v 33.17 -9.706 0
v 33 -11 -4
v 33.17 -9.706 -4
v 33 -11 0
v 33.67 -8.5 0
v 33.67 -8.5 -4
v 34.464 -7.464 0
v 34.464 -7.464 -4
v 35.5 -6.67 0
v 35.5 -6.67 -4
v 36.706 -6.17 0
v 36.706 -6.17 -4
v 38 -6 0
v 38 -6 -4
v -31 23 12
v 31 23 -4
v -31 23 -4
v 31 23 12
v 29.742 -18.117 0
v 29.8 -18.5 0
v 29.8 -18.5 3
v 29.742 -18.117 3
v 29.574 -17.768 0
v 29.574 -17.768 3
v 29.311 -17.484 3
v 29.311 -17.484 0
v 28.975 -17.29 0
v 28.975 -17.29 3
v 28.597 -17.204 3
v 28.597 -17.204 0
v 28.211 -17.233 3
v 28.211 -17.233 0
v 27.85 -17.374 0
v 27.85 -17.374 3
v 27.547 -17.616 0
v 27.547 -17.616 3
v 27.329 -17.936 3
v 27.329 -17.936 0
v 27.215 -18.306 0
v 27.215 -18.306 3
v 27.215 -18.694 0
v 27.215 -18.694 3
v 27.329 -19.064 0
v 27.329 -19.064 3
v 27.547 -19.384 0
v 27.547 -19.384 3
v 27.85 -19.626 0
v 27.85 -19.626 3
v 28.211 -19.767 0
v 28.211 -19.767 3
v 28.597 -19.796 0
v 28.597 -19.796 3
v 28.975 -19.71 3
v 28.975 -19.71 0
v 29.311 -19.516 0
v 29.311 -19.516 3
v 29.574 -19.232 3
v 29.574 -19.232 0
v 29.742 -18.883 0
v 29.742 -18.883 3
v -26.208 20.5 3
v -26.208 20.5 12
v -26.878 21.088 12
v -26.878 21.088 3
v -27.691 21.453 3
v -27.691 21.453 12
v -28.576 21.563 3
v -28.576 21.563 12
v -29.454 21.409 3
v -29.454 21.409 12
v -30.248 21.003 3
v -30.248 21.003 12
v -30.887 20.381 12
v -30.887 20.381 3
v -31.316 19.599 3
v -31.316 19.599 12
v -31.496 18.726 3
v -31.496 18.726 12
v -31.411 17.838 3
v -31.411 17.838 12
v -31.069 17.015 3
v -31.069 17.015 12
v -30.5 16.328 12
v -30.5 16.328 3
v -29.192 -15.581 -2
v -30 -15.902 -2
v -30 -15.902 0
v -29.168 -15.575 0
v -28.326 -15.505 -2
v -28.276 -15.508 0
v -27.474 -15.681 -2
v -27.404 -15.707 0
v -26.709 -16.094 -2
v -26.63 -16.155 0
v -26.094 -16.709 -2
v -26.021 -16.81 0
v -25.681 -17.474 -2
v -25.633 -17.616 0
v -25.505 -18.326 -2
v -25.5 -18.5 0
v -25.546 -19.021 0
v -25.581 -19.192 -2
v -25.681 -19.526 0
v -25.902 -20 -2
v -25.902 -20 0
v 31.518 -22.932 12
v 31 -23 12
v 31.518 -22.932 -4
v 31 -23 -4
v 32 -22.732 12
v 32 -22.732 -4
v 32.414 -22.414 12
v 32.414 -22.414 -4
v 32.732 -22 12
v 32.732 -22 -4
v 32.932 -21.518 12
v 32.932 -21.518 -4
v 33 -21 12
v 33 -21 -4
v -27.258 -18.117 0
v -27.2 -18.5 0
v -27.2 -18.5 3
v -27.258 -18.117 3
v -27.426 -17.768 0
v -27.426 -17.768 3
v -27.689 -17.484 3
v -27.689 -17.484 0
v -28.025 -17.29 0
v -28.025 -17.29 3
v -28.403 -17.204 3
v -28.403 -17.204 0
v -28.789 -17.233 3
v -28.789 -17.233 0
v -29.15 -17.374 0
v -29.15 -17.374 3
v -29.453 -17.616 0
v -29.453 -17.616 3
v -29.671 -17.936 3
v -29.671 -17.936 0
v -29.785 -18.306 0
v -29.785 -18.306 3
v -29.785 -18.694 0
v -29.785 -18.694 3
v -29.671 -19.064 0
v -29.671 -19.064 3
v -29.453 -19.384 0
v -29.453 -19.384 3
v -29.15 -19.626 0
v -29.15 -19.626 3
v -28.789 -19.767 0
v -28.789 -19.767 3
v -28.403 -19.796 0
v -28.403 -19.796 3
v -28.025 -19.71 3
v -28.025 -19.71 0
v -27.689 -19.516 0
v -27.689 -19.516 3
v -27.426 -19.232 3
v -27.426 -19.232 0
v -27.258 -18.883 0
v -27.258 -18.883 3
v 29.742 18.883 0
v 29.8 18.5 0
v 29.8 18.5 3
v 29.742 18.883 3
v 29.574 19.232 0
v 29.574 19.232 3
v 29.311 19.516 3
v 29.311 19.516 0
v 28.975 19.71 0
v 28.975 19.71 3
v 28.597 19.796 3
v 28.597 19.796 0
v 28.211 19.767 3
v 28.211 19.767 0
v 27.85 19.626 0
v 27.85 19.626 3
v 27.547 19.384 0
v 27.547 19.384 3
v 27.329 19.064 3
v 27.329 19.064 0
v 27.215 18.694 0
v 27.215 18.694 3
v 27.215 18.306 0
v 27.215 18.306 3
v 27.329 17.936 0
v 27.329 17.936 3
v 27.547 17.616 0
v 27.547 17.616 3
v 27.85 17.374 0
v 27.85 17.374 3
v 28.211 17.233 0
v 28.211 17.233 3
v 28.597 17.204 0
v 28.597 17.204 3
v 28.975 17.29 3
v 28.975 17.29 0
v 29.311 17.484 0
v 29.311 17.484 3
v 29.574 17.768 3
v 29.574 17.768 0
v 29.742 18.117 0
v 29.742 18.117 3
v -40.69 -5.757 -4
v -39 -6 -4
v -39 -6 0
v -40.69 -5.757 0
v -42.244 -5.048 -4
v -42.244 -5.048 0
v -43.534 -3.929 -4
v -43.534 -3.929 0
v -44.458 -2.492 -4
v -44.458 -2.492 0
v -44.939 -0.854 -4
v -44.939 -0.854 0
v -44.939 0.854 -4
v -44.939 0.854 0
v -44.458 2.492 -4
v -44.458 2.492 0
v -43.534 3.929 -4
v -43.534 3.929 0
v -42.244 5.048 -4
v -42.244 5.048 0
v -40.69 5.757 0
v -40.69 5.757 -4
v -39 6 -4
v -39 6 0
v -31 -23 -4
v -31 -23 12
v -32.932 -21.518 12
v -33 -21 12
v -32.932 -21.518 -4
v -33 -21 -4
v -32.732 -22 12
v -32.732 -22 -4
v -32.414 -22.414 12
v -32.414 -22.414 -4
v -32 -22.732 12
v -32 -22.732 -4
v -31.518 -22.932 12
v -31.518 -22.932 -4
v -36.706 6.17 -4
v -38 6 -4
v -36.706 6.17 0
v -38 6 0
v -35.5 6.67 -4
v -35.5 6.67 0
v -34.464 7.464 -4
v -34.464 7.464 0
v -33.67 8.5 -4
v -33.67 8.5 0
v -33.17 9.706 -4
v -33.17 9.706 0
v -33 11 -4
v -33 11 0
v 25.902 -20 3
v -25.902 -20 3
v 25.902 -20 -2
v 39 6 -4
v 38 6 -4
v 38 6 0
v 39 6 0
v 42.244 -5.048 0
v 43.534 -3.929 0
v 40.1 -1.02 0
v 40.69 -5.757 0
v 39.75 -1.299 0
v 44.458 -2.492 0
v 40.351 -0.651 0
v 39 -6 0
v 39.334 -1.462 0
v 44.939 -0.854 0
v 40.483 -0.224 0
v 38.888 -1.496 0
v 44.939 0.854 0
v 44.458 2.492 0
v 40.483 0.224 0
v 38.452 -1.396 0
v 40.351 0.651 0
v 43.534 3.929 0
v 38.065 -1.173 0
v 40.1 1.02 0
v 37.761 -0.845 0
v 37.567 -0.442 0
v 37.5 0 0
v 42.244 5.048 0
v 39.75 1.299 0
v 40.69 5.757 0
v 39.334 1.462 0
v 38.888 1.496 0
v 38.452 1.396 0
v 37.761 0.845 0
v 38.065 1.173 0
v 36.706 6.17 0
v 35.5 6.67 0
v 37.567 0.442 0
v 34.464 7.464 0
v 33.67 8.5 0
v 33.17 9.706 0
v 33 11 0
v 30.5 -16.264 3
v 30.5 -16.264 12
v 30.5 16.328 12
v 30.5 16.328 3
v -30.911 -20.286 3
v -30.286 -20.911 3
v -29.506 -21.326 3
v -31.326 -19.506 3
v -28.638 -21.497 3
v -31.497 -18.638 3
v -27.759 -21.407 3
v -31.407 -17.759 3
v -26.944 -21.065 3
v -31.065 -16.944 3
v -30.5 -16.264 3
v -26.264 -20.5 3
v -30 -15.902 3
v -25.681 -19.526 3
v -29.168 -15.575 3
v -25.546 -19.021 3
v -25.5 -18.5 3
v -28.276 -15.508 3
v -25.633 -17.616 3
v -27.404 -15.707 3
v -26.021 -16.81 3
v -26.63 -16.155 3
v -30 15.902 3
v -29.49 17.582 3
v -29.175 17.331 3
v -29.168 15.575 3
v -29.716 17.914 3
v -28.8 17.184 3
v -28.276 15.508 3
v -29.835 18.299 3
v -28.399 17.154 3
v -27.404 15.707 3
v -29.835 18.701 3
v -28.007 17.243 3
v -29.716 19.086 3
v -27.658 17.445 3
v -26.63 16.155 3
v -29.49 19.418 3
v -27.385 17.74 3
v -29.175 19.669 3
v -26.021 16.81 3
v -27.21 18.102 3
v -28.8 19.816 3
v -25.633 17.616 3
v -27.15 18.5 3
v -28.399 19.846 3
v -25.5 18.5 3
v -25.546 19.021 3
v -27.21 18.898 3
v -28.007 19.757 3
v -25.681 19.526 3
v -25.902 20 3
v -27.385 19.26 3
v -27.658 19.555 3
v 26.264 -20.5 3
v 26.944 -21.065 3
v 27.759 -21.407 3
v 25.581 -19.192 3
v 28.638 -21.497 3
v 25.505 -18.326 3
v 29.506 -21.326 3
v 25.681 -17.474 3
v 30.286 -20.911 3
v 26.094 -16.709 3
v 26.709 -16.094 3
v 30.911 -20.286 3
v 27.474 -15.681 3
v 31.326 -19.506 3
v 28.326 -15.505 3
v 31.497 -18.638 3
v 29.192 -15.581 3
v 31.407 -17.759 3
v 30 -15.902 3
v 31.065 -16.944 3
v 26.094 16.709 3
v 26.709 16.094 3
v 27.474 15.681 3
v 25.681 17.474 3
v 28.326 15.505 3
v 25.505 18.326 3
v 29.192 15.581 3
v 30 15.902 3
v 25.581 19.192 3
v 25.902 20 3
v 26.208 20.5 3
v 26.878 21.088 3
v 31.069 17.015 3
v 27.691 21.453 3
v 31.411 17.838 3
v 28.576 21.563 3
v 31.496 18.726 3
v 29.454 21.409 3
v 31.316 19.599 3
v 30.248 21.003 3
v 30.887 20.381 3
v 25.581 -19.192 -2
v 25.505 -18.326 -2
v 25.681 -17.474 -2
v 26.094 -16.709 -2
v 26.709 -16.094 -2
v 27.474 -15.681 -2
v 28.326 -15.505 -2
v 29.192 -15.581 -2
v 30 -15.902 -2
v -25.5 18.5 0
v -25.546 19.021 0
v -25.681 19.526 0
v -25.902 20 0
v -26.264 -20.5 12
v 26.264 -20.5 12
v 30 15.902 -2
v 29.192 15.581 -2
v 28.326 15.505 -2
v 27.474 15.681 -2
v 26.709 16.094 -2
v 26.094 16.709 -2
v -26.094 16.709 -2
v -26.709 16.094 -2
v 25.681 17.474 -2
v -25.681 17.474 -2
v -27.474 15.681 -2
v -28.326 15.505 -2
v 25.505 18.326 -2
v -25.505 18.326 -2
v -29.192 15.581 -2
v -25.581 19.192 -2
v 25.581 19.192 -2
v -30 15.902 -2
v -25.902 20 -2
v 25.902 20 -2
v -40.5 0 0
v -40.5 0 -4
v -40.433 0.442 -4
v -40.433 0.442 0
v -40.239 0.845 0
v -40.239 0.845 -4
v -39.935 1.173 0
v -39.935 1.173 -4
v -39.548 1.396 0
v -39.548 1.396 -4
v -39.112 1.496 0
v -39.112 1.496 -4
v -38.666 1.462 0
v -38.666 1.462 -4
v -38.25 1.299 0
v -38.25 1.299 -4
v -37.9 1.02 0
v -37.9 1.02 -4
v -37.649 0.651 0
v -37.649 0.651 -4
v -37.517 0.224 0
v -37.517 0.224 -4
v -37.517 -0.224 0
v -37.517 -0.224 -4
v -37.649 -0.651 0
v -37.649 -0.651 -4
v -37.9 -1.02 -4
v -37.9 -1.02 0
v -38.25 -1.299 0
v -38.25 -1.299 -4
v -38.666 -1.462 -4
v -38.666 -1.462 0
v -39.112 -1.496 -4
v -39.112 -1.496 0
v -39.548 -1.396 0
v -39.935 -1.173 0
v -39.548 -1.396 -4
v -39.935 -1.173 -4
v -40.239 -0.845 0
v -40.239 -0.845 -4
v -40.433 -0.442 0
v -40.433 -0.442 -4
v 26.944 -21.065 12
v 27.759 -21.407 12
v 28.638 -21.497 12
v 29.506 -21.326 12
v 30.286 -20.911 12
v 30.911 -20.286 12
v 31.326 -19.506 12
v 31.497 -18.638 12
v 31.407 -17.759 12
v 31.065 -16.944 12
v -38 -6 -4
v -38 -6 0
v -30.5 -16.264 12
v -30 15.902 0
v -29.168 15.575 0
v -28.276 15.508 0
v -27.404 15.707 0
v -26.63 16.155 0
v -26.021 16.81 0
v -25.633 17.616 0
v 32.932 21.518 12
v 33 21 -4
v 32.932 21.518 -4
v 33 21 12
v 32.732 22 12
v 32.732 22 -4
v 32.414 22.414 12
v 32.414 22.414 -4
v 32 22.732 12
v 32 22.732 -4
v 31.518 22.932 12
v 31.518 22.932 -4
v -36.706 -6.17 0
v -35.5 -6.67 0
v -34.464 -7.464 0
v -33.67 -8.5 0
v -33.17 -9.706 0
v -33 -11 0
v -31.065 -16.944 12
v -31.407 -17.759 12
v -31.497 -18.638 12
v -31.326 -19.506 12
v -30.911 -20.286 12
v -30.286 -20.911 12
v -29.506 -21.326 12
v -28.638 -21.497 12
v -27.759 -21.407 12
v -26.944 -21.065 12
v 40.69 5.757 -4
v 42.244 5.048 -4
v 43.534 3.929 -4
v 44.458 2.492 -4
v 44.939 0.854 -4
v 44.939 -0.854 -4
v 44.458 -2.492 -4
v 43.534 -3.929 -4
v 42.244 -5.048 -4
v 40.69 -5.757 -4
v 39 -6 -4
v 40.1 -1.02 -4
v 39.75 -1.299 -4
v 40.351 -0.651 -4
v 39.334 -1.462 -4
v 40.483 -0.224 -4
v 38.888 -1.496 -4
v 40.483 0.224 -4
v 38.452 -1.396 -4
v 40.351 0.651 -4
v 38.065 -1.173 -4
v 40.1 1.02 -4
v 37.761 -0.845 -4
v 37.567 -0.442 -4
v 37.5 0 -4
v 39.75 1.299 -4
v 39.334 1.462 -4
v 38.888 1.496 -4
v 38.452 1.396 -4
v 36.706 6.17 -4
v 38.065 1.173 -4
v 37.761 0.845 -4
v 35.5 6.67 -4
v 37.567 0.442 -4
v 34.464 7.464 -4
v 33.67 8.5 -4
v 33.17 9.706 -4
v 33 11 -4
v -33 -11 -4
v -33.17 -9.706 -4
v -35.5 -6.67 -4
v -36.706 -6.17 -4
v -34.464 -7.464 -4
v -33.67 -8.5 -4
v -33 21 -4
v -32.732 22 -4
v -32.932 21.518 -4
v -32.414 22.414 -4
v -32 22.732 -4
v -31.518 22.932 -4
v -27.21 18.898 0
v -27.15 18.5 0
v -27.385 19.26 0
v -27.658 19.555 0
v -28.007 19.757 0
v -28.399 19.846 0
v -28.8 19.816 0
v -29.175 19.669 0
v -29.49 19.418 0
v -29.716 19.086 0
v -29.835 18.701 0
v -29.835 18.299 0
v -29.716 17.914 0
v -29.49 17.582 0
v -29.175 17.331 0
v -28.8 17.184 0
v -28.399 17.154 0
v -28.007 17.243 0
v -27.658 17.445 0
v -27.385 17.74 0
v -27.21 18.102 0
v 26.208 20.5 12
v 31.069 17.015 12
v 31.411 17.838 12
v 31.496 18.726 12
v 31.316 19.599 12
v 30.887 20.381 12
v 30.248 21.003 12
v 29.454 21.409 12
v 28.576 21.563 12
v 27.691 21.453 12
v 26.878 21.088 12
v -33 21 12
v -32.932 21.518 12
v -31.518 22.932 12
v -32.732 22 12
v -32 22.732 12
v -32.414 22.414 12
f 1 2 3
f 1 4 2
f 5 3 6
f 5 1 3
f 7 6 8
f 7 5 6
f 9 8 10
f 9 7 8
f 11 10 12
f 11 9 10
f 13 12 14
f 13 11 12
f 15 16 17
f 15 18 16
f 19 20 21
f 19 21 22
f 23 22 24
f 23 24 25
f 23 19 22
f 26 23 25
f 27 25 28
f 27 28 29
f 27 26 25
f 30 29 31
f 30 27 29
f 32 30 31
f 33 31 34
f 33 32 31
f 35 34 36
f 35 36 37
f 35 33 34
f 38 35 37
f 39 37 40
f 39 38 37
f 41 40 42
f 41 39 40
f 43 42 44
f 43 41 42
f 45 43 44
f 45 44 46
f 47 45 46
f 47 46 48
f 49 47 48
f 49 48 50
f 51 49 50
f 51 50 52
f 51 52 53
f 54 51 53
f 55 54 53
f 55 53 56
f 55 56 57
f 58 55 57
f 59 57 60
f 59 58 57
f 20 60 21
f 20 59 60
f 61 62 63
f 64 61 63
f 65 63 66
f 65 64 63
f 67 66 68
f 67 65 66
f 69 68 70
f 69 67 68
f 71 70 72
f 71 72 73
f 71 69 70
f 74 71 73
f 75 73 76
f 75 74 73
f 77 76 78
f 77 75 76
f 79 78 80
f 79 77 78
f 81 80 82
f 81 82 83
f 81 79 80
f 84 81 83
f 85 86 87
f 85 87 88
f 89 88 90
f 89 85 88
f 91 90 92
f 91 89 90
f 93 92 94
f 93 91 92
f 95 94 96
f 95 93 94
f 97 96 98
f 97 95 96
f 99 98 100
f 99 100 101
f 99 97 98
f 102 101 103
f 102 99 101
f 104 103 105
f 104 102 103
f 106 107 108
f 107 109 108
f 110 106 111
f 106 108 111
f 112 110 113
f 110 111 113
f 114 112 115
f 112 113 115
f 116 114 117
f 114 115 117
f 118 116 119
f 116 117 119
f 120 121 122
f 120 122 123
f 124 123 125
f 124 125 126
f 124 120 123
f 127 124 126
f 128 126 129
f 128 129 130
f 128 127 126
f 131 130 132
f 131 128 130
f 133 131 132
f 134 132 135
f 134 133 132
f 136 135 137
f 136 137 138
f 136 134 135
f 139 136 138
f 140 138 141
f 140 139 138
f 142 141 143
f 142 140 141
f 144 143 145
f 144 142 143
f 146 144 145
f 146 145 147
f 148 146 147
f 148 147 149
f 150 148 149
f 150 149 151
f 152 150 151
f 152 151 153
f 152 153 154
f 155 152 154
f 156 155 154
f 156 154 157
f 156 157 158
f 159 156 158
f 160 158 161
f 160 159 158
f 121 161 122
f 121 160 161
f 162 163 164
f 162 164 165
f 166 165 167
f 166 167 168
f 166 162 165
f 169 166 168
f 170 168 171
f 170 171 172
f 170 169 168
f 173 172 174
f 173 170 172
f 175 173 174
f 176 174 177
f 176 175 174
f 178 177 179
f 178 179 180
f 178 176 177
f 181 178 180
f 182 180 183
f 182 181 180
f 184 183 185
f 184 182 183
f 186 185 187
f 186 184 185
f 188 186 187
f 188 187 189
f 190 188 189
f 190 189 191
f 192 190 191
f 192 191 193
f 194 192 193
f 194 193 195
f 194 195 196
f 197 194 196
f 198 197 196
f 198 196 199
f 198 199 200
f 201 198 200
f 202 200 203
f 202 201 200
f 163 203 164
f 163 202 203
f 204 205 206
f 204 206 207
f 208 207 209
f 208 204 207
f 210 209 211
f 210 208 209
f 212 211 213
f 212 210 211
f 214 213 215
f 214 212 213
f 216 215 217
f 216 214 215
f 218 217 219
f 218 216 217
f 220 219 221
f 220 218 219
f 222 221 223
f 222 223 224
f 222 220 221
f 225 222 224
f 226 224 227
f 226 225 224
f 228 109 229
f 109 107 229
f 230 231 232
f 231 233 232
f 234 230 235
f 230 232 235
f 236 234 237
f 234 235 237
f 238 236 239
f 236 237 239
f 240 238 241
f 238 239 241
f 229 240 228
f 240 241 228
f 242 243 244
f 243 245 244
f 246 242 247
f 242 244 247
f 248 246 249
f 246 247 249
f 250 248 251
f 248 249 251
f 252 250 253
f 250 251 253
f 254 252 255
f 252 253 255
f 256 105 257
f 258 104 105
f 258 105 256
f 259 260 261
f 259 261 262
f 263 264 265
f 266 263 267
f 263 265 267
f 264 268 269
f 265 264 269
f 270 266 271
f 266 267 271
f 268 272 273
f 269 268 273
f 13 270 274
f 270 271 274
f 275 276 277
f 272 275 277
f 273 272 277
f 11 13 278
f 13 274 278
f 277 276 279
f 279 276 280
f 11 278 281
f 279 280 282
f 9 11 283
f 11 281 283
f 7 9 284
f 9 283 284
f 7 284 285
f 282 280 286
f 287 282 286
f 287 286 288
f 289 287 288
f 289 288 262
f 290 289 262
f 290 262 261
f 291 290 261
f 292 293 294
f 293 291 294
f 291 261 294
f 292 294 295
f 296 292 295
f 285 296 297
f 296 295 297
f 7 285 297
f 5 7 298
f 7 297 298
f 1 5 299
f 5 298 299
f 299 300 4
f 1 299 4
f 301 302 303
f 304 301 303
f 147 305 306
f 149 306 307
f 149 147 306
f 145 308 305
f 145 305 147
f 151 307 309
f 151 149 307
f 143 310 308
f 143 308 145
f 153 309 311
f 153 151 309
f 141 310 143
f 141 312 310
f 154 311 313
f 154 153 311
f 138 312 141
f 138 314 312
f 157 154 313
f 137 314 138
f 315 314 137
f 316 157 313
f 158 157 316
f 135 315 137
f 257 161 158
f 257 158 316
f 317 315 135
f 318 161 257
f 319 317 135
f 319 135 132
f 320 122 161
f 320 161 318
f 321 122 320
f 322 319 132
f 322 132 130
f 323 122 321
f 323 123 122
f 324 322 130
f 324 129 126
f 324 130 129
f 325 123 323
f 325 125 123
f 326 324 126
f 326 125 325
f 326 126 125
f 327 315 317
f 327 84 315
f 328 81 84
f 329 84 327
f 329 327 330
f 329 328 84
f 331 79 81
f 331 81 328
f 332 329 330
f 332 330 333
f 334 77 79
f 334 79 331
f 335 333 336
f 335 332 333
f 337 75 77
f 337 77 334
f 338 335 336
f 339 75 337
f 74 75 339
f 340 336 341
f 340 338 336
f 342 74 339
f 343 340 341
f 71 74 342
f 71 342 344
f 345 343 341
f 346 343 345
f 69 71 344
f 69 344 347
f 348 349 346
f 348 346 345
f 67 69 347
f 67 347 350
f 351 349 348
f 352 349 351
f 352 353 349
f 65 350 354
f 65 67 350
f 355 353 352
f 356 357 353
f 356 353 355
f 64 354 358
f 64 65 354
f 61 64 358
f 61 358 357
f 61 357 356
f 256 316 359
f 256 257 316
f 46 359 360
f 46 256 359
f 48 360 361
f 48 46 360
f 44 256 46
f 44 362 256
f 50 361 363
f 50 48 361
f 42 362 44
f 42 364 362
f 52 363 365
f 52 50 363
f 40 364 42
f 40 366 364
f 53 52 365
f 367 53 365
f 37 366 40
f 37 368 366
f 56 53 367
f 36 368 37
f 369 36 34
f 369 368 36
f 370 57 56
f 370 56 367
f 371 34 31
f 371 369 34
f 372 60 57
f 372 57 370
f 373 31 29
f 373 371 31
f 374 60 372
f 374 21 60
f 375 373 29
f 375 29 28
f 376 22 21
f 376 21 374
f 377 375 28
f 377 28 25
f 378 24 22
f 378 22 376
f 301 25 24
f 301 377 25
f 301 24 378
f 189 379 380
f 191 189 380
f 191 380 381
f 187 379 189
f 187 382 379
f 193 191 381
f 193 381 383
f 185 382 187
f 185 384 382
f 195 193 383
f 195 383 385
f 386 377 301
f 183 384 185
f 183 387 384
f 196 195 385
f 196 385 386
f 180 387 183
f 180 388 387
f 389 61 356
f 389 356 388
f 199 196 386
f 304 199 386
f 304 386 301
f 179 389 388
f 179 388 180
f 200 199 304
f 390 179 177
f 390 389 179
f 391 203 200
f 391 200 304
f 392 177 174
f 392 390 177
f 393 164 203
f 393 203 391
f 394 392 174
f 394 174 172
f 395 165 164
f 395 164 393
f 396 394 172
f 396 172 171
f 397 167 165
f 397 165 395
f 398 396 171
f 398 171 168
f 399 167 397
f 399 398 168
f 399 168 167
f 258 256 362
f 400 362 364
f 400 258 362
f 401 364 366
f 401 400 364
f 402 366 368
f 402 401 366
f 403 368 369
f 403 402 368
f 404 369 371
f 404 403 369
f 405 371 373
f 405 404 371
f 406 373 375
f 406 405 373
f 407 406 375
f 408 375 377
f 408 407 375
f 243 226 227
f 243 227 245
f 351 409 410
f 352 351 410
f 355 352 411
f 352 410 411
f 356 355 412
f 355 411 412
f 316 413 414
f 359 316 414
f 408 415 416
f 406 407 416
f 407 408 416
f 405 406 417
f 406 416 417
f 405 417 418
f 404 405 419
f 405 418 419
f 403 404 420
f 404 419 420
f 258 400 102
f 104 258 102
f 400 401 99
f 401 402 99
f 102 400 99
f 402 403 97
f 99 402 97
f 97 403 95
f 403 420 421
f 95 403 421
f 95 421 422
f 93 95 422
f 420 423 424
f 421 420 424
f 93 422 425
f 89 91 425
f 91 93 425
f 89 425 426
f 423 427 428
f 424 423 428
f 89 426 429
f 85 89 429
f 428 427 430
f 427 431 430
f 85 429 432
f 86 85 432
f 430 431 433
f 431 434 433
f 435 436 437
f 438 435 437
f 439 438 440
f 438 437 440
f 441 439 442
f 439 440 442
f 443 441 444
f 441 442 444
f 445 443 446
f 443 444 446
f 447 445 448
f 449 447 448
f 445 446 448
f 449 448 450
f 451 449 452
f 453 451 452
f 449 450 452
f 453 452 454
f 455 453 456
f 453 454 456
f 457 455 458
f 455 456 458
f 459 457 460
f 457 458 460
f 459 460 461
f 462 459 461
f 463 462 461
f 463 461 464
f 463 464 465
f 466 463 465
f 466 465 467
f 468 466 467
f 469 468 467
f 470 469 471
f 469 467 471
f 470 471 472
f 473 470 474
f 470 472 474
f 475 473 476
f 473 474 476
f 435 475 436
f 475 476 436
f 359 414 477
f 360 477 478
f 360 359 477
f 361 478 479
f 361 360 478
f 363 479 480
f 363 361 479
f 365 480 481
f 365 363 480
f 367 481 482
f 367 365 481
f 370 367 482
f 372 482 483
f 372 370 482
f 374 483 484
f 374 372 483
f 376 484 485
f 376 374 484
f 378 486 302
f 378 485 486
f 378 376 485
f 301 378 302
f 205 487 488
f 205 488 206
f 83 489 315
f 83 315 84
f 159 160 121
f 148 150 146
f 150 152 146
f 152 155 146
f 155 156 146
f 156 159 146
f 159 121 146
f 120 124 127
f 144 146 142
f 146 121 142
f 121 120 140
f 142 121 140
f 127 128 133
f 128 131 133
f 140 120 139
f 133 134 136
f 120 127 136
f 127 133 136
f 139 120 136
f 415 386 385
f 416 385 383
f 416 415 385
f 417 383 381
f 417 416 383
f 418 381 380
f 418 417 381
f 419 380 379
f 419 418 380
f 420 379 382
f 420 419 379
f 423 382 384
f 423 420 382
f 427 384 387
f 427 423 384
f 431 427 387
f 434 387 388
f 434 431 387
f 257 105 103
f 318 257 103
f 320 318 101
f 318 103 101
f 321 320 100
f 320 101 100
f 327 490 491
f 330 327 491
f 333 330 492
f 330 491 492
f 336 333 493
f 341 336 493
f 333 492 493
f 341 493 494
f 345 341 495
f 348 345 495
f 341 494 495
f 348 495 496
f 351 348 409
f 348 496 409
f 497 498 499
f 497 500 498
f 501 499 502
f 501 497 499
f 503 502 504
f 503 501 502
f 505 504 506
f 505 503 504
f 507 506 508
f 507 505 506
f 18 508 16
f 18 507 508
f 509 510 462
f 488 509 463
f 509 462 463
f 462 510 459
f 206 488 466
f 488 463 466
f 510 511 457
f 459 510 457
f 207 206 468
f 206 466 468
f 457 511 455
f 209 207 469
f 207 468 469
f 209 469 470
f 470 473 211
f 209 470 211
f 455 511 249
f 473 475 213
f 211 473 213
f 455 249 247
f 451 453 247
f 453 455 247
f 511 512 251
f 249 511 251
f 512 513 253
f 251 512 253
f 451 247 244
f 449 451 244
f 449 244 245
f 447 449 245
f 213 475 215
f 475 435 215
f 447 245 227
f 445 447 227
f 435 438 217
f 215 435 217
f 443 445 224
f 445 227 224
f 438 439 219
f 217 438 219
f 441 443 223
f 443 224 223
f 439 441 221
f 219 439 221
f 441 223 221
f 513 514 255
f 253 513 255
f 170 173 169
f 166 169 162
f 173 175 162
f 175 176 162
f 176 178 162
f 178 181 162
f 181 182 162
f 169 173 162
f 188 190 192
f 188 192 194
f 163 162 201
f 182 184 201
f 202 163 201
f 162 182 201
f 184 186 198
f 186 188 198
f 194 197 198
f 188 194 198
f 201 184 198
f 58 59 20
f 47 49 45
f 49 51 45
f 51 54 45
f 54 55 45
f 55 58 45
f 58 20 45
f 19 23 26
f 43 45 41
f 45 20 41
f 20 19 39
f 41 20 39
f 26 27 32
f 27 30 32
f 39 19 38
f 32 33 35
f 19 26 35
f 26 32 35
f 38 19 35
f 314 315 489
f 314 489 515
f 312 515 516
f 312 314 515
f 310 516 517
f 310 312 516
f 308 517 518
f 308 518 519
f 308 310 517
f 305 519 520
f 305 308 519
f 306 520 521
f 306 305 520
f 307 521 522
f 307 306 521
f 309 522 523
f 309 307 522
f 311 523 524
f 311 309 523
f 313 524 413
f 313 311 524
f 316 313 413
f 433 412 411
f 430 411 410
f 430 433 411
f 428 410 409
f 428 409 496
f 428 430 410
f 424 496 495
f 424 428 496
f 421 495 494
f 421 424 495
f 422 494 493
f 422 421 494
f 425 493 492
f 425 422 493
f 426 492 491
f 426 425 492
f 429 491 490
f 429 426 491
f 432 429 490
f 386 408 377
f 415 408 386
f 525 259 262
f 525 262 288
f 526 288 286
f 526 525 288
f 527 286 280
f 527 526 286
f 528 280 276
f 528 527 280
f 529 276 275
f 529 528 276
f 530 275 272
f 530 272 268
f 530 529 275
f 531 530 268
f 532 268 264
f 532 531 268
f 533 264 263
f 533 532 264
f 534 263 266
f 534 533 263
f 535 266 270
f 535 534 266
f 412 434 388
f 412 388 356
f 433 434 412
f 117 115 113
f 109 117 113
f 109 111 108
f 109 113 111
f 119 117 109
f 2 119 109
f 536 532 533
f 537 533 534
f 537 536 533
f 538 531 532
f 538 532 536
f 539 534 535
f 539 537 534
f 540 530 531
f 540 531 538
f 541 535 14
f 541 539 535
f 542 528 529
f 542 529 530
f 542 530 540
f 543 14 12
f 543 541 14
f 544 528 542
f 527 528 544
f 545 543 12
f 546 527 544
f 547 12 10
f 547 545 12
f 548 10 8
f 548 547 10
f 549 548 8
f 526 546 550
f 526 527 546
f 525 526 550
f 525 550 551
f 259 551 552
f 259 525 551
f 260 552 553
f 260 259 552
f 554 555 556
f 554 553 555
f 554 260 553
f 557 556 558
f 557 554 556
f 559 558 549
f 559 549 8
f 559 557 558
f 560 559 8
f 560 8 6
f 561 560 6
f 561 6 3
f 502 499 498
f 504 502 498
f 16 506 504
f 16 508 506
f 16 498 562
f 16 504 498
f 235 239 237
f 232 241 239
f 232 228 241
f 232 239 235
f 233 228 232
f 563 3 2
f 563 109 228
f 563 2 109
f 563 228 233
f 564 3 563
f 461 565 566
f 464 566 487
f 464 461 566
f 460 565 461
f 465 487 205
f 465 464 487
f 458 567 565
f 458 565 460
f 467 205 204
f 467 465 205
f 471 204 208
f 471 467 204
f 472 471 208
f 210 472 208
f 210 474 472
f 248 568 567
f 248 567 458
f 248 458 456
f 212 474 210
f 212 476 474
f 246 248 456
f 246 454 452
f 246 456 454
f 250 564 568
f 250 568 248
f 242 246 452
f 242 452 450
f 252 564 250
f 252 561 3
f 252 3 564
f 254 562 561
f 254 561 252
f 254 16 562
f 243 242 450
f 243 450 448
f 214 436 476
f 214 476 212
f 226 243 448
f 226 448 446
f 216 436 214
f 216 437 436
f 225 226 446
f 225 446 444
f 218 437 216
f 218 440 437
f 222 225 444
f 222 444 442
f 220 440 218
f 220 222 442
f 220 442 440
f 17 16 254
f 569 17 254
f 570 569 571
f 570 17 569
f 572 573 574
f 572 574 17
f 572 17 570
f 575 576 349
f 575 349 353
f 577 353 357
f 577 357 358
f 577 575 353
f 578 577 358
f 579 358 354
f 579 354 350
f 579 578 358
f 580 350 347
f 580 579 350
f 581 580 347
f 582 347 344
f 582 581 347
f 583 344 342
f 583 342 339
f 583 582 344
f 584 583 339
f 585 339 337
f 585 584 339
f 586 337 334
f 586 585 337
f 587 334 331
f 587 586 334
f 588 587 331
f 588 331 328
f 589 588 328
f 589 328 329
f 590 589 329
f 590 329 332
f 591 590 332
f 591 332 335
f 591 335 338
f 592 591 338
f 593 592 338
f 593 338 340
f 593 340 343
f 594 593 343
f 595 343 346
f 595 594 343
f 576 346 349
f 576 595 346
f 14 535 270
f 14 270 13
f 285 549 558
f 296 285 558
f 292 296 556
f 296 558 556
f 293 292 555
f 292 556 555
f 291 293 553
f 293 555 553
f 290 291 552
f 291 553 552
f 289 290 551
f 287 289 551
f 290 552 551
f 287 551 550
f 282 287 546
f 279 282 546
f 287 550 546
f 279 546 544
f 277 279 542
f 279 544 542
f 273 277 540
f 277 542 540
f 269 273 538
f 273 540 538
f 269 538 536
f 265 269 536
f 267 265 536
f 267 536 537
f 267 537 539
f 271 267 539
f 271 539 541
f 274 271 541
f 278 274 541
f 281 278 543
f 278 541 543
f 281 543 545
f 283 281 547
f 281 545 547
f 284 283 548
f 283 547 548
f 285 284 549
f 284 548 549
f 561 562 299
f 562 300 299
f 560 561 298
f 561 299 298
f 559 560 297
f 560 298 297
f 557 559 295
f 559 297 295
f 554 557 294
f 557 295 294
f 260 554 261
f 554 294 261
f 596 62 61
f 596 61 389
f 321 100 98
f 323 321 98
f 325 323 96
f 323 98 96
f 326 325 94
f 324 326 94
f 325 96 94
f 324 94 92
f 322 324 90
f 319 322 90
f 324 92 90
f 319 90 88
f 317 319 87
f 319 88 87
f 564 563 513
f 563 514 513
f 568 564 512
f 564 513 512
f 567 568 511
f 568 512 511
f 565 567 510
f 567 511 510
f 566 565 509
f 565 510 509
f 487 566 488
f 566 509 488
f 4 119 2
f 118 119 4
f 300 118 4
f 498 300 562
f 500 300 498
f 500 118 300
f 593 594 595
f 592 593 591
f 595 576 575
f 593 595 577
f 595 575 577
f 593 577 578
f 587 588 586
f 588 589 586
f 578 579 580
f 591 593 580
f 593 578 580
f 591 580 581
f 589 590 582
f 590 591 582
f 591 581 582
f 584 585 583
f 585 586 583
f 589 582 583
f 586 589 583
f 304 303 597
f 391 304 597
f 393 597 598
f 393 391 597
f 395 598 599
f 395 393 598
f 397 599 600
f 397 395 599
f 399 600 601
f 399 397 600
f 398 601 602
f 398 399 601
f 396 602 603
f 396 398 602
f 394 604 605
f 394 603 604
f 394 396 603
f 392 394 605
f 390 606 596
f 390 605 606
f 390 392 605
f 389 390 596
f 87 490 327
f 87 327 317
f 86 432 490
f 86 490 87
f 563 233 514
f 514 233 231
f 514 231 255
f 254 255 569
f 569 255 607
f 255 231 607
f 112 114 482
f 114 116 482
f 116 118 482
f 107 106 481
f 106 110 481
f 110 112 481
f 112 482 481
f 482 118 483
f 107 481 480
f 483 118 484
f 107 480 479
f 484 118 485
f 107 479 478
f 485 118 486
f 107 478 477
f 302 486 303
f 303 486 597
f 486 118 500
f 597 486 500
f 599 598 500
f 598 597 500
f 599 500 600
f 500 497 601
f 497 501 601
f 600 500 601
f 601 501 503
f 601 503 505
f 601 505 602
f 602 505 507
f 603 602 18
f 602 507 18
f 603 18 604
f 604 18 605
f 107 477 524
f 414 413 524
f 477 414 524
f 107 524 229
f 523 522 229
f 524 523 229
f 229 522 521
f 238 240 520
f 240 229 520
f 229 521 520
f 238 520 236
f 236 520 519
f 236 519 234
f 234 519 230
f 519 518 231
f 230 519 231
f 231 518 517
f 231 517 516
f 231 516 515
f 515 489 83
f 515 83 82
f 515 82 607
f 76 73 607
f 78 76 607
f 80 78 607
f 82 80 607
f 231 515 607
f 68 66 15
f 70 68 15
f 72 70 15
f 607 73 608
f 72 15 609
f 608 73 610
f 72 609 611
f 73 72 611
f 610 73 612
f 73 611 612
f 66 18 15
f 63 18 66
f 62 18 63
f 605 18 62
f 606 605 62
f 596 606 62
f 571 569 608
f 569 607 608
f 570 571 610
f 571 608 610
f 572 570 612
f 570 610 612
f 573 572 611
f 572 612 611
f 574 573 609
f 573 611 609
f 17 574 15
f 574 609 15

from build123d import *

# Parameters (mm, degrees)
SKETCH1_R           = 1.5
SKETCH1_R_2         = 1.35
SKETCH1_R_3         = 1.3
BOSS_EXTRUDE1_DEPTH = 3
BOSS_EXTRUDE2_START = 2
SKETCH2_W           = 64
SKETCH2_H           = 44
SKETCH2_R           = 1.3
BOSS_EXTRUDE2_DEPTH = 2
SKETCH3_W           = 64
SKETCH3_H           = 44
SKETCH3_W_2         = 60
SKETCH3_H_2         = 40
BOSS_EXTRUDE3_DEPTH = 12
SKETCH4_W           = 61
SKETCH4_H           = 41
SKETCH4_W_2         = 60
SKETCH4_H_2         = 40
CUT_EXTRUDE1_DEPTH  = 9
SKETCH5_R           = 3
CUT_EXTRUDE2_DEPTH  = 9
CUT_EXTRUDE3_START  = -9
CUT_EXTRUDE3_DEPTH  = 9
SKETCH7_W           = 66
SKETCH7_H           = 46
SKETCH7_W_2         = 64
SKETCH7_H_2         = 44
BOSS_EXTRUDE4_DEPTH = 14
SKETCH8_W           = 66
SKETCH8_H           = 46
BOSS_EXTRUDE5_DEPTH = 2
SKETCH9_R           = 6
SKETCH9_R_2         = 1.5
BOSS_EXTRUDE7_DEPTH = 4
FILLET1_R           = 5
FILLET2_R           = 2


with BuildPart() as part:
    # Sketch1 → Boss-Extrude1 (new body)
    # profile 1 of 12: a face of its own
    with BuildSketch(Plane.XY):
        with BuildLine():
            Line((-25.901923789, 20), (-28.5, 20))
            ThreePointArc((-28.5, 20), (-27.439339828, 19.560660172), (-27, 18.5))
            ThreePointArc((-27, 18.5), (-28.5, 17), (-30, 18.5))
            Line((-30, 18.5), (-30, 15.901923789))
            ThreePointArc((-30, 15.901923789), (-27, 15.901923789), (-25.5, 18.5))
            ThreePointArc((-25.5, 18.5), (-25.602222521, 19.276457135), (-25.901923789, 20))
        make_face()
    # profile 2 of 12: a face of its own
    with BuildSketch(Plane.XY):
        with BuildLine():
            Line((28.5, 20), (25.901923789, 20))
            ThreePointArc((25.901923789, 20), (26.378679656, 16.378679656), (30, 15.901923789))
            Line((30, 15.901923789), (30, 18.5))
            ThreePointArc((30, 18.5), (27.439339828, 17.439339828), (28.5, 20))
        make_face()
    # profile 3 of 12: a face of its own
    with BuildSketch(Plane.XY):
        with BuildLine():
            Line((30, -18.5), (30, -15.901923789))
            ThreePointArc((30, -15.901923789), (26.378679656, -16.378679656), (25.901923789, -20))
            Line((25.901923789, -20), (28.5, -20))
            ThreePointArc((28.5, -20), (27.439339828, -17.439339828), (30, -18.5))
        make_face()
    # profile 4 of 12: a face of its own
    with BuildSketch(Plane.XY):
        with BuildLine():
            ThreePointArc((-25.5, -18.5), (-27, -15.901923789), (-30, -15.901923789))
            Line((-30, -15.901923789), (-30, -18.5))
            ThreePointArc((-30, -18.5), (-28.5, -17), (-27, -18.5))
            ThreePointArc((-27, -18.5), (-27.439339828, -19.560660172), (-28.5, -20))
            Line((-28.5, -20), (-25.901923789, -20))
            ThreePointArc((-25.901923789, -20), (-25.602222521, -19.276457135), (-25.5, -18.5))
        make_face()
    # profile 5 of 12: a face of its own
    with BuildSketch(Plane.XY):
        with BuildLine():
            Line((-28.5, 20), (-30, 20))
            Line((-30, 20), (-30, 18.5))
            ThreePointArc((-30, 18.5), (-29.560660172, 19.560660172), (-28.5, 20))
        make_face()
    # profile 6 of 12: a face of its own
    with BuildSketch(Plane.XY):
        with Locations((-28.5, 18.5)):
            Circle(SKETCH1_R)
        with Locations((-28.5, 18.5)):
            Circle(SKETCH1_R_2, mode=Mode.SUBTRACT)
    # profile 7 of 12: a face of its own
    with BuildSketch(Plane.XY):
        with BuildLine():
            Line((30, 20), (28.5, 20))
            ThreePointArc((28.5, 20), (29.560660172, 19.560660172), (30, 18.5))
            Line((30, 18.5), (30, 20))
        make_face()
    # profile 8 of 12: a face of its own
    with BuildSketch(Plane.XY):
        with Locations((28.5, 18.5)):
            Circle(SKETCH1_R)
        with Locations((28.5, 18.5)):
            Circle(SKETCH1_R_3, mode=Mode.SUBTRACT)
    # profile 9 of 12: a face of its own
    with BuildSketch(Plane.XY):
        with BuildLine():
            Line((30, -20), (30, -18.5))
            ThreePointArc((30, -18.5), (29.560660172, -19.560660172), (28.5, -20))
            Line((28.5, -20), (30, -20))
        make_face()
    # profile 10 of 12: a face of its own
    with BuildSketch(Plane.XY):
        with Locations((28.5, -18.5)):
            Circle(SKETCH1_R)
        with Locations((28.5, -18.5)):
            Circle(SKETCH1_R_3, mode=Mode.SUBTRACT)
    # profile 11 of 12: a face of its own
    with BuildSketch(Plane.XY):
        with BuildLine():
            ThreePointArc((-28.5, -20), (-29.560660172, -19.560660172), (-30, -18.5))
            Line((-30, -18.5), (-30, -20))
            Line((-30, -20), (-28.5, -20))
        make_face()
    # profile 12 of 12: a face of its own
    with BuildSketch(Plane.XY):
        with Locations((-28.5, -18.5)):
            Circle(SKETCH1_R)
        with Locations((-28.5, -18.5)):
            Circle(SKETCH1_R_3, mode=Mode.SUBTRACT)
    extrude(amount=BOSS_EXTRUDE1_DEPTH)

    # Sketch2 → Boss-Extrude2 (add)
    # profile 1 of 4: a face of its own
    with BuildSketch(Plane(origin=(0, 0, 0), x_dir=(-1, 0, 0), z_dir=(0, 0, -1)).offset(BOSS_EXTRUDE2_START)):
        Rectangle(SKETCH2_W, SKETCH2_H)
        Polygon((-30, 15.901923789), (-30, 20), (-25.901923789, 20), (30, 20), (30, -20), (-30, -20), align=None, mode=Mode.SUBTRACT)
    # profile 2 of 4: a face of its own
    with BuildSketch(Plane(origin=(0, 0, 0), x_dir=(-1, 0, 0), z_dir=(0, 0, -1)).offset(BOSS_EXTRUDE2_START)):
        with BuildLine():
            Line((30, 20), (-25.901923789, 20))
            ThreePointArc((-25.901923789, 20), (-26.378679656, 16.378679656), (-30, 15.901923789))
            Line((-30, 15.901923789), (-30, -20))
            Line((-30, -20), (30, -20))
            Line((30, -20), (30, 20))
        make_face()
    # profile 3 of 4: a face of its own
    with BuildSketch(Plane(origin=(0, 0, 0), x_dir=(-1, 0, 0), z_dir=(0, 0, -1)).offset(BOSS_EXTRUDE2_START)):
        with BuildLine():
            ThreePointArc((-30, 15.901923789), (-26.378679656, 16.378679656), (-25.901923789, 20))
            Line((-25.901923789, 20), (-30, 20))
            Line((-30, 20), (-30, 15.901923789))
        make_face()
        with Locations(Location((-28.5, 18.5, 0), (0, 0, 180))):
            Circle(SKETCH2_R, mode=Mode.SUBTRACT)
    # profile 4 of 4: a face of its own
    with BuildSketch(Plane(origin=(0, 0, 0), x_dir=(-1, 0, 0), z_dir=(0, 0, -1)).offset(BOSS_EXTRUDE2_START)):
        with Locations(Location((-28.5, 18.5, 0), (0, 0, 180))):
            Circle(SKETCH2_R)
    extrude(amount=-BOSS_EXTRUDE2_DEPTH)

    # Sketch3 → Boss-Extrude3 (add)
    with BuildSketch(Plane.XY):
        Rectangle(SKETCH3_W, SKETCH3_H)
        Rectangle(SKETCH3_W_2, SKETCH3_H_2, mode=Mode.SUBTRACT)
    extrude(amount=BOSS_EXTRUDE3_DEPTH)

    # Sketch4 → Cut-Extrude1 (cut)
    with BuildSketch(Plane.XY.offset(12)):
        Rectangle(SKETCH4_W, SKETCH4_H)
        Rectangle(SKETCH4_W_2, SKETCH4_H_2, mode=Mode.SUBTRACT)
    extrude(amount=-CUT_EXTRUDE1_DEPTH, mode=Mode.SUBTRACT)

    # Sketch5 → Cut-Extrude2 (cut)
    with BuildSketch(Plane.XY.offset(3)):
        with Locations((28.5, -18.5)):
            Circle(SKETCH5_R)
        with Locations((-28.5, -18.5)):
            Circle(SKETCH5_R)
        with Locations((-28.5, 18.564453257)):
            Circle(SKETCH5_R)
        with Locations((28.5, 18.564453257)):
            Circle(SKETCH5_R)
    extrude(amount=CUT_EXTRUDE2_DEPTH, mode=Mode.SUBTRACT)

    # Sketch6 → Cut-Extrude3 (cut)
    with BuildSketch(Plane.XY.offset(CUT_EXTRUDE3_START)):
        with BuildLine():
            Line((30, -15.901923789), (30, 15.901923789))
            ThreePointArc((30, 15.901923789), (26.378679656, 16.378679656), (25.901923789, 20))
            Line((25.901923789, 20), (-25.901923789, 20))
            ThreePointArc((-25.901923789, 20), (-26.378679656, 16.378679656), (-30, 15.901923789))
            Line((-30, 15.901923789), (-30, -15.901923789))
            ThreePointArc((-30, -15.901923789), (-26.378679656, -16.378679656), (-25.901923789, -20))
            Line((-25.901923789, -20), (25.901923789, -20))
            ThreePointArc((25.901923789, -20), (26.378679656, -16.378679656), (30, -15.901923789))
        make_face()
    extrude(amount=CUT_EXTRUDE3_DEPTH, mode=Mode.SUBTRACT)

    # Sketch7 → Boss-Extrude4 (add)
    with BuildSketch(Plane(origin=(0, 0, -2), x_dir=(-1, 0, 0), z_dir=(0, 0, -1))):
        Rectangle(SKETCH7_W, SKETCH7_H)
        Rectangle(SKETCH7_W_2, SKETCH7_H_2, mode=Mode.SUBTRACT)
    extrude(amount=-BOSS_EXTRUDE4_DEPTH)

    # Sketch8 → Boss-Extrude5 (add)
    with BuildSketch(Plane(origin=(0, 0, -2), x_dir=(-1, 0, 0), z_dir=(0, 0, -1))):
        Rectangle(SKETCH8_W, SKETCH8_H)
    extrude(amount=BOSS_EXTRUDE5_DEPTH)

    # Sketch9 → Boss-Extrude7 (add)
    # profile 1 of 6: a face of its own
    with BuildSketch(Plane(origin=(0, 0, -4), x_dir=(-1, 0, 0), z_dir=(0, 0, -1))):
        with Locations((39, 0)):
            Circle(SKETCH9_R)
        with Locations((39, 0)):
            Circle(SKETCH9_R_2, mode=Mode.SUBTRACT)
    # profile 2 of 6: a face of its own
    with BuildSketch(Plane(origin=(0, 0, -4), x_dir=(-1, 0, 0), z_dir=(0, 0, -1))):
        with BuildLine():
            ThreePointArc((33, 1e-09), (34.757359313, 4.242640687), (39, 6))
            Line((39, 6), (33, 6))
            Line((33, 6), (33, 1e-09))
        make_face()
    # profile 3 of 6: a face of its own
    with BuildSketch(Plane(origin=(0, 0, -4), x_dir=(-1, 0, 0), z_dir=(0, 0, -1))):
        with BuildLine():
            ThreePointArc((39, -6), (34.757359313, -4.242640687), (33, 1e-09))
            Line((33, 1e-09), (33, -6))
            Line((33, -6), (39, -6))
        make_face()
    # profile 4 of 6: a face of its own
    with BuildSketch(Plane(origin=(0, 0, -4), x_dir=(-1, 0, 0), z_dir=(0, 0, -1))):
        with Locations((-39, 0)):
            Circle(SKETCH9_R)
        with Locations((-39, 0)):
            Circle(SKETCH9_R_2, mode=Mode.SUBTRACT)
    # profile 5 of 6: a face of its own
    with BuildSketch(Plane(origin=(0, 0, -4), x_dir=(-1, 0, 0), z_dir=(0, 0, -1))):
        with BuildLine():
            Line((-33, 0), (-33, 6))
            Line((-33, 6), (-39, 6))
            ThreePointArc((-39, 6), (-34.757359313, 4.242640687), (-33, 0))
        make_face()
    # profile 6 of 6: a face of its own
    with BuildSketch(Plane(origin=(0, 0, -4), x_dir=(-1, 0, 0), z_dir=(0, 0, -1))):
        with BuildLine():
            Line((-33, -6), (-33, 0))
            ThreePointArc((-33, 0), (-34.757359313, -4.242640687), (-39, -6))
            Line((-39, -6), (-33, -6))
        make_face()
    extrude(amount=-BOSS_EXTRUDE7_DEPTH)

    # Fillet1
    fillet1_edges = [part.edges().sort_by_distance(p)[0] for p in [
        (-33, 6, -2),
        (-33, -6, -2),
        (33, -6, -2),
        (33, 6, -2),
    ]]
    fillet(fillet1_edges, radius=FILLET1_R)

    # Fillet2
    fillet2_edges = [part.edges().sort_by_distance(p)[0] for p in [
        (-33, 23, 4),
        (33, -23, 4),
        (-33, -23, 4),
        (33, 23, 4),
    ]]
    fillet(fillet2_edges, radius=FILLET2_R)


solid = part.part
